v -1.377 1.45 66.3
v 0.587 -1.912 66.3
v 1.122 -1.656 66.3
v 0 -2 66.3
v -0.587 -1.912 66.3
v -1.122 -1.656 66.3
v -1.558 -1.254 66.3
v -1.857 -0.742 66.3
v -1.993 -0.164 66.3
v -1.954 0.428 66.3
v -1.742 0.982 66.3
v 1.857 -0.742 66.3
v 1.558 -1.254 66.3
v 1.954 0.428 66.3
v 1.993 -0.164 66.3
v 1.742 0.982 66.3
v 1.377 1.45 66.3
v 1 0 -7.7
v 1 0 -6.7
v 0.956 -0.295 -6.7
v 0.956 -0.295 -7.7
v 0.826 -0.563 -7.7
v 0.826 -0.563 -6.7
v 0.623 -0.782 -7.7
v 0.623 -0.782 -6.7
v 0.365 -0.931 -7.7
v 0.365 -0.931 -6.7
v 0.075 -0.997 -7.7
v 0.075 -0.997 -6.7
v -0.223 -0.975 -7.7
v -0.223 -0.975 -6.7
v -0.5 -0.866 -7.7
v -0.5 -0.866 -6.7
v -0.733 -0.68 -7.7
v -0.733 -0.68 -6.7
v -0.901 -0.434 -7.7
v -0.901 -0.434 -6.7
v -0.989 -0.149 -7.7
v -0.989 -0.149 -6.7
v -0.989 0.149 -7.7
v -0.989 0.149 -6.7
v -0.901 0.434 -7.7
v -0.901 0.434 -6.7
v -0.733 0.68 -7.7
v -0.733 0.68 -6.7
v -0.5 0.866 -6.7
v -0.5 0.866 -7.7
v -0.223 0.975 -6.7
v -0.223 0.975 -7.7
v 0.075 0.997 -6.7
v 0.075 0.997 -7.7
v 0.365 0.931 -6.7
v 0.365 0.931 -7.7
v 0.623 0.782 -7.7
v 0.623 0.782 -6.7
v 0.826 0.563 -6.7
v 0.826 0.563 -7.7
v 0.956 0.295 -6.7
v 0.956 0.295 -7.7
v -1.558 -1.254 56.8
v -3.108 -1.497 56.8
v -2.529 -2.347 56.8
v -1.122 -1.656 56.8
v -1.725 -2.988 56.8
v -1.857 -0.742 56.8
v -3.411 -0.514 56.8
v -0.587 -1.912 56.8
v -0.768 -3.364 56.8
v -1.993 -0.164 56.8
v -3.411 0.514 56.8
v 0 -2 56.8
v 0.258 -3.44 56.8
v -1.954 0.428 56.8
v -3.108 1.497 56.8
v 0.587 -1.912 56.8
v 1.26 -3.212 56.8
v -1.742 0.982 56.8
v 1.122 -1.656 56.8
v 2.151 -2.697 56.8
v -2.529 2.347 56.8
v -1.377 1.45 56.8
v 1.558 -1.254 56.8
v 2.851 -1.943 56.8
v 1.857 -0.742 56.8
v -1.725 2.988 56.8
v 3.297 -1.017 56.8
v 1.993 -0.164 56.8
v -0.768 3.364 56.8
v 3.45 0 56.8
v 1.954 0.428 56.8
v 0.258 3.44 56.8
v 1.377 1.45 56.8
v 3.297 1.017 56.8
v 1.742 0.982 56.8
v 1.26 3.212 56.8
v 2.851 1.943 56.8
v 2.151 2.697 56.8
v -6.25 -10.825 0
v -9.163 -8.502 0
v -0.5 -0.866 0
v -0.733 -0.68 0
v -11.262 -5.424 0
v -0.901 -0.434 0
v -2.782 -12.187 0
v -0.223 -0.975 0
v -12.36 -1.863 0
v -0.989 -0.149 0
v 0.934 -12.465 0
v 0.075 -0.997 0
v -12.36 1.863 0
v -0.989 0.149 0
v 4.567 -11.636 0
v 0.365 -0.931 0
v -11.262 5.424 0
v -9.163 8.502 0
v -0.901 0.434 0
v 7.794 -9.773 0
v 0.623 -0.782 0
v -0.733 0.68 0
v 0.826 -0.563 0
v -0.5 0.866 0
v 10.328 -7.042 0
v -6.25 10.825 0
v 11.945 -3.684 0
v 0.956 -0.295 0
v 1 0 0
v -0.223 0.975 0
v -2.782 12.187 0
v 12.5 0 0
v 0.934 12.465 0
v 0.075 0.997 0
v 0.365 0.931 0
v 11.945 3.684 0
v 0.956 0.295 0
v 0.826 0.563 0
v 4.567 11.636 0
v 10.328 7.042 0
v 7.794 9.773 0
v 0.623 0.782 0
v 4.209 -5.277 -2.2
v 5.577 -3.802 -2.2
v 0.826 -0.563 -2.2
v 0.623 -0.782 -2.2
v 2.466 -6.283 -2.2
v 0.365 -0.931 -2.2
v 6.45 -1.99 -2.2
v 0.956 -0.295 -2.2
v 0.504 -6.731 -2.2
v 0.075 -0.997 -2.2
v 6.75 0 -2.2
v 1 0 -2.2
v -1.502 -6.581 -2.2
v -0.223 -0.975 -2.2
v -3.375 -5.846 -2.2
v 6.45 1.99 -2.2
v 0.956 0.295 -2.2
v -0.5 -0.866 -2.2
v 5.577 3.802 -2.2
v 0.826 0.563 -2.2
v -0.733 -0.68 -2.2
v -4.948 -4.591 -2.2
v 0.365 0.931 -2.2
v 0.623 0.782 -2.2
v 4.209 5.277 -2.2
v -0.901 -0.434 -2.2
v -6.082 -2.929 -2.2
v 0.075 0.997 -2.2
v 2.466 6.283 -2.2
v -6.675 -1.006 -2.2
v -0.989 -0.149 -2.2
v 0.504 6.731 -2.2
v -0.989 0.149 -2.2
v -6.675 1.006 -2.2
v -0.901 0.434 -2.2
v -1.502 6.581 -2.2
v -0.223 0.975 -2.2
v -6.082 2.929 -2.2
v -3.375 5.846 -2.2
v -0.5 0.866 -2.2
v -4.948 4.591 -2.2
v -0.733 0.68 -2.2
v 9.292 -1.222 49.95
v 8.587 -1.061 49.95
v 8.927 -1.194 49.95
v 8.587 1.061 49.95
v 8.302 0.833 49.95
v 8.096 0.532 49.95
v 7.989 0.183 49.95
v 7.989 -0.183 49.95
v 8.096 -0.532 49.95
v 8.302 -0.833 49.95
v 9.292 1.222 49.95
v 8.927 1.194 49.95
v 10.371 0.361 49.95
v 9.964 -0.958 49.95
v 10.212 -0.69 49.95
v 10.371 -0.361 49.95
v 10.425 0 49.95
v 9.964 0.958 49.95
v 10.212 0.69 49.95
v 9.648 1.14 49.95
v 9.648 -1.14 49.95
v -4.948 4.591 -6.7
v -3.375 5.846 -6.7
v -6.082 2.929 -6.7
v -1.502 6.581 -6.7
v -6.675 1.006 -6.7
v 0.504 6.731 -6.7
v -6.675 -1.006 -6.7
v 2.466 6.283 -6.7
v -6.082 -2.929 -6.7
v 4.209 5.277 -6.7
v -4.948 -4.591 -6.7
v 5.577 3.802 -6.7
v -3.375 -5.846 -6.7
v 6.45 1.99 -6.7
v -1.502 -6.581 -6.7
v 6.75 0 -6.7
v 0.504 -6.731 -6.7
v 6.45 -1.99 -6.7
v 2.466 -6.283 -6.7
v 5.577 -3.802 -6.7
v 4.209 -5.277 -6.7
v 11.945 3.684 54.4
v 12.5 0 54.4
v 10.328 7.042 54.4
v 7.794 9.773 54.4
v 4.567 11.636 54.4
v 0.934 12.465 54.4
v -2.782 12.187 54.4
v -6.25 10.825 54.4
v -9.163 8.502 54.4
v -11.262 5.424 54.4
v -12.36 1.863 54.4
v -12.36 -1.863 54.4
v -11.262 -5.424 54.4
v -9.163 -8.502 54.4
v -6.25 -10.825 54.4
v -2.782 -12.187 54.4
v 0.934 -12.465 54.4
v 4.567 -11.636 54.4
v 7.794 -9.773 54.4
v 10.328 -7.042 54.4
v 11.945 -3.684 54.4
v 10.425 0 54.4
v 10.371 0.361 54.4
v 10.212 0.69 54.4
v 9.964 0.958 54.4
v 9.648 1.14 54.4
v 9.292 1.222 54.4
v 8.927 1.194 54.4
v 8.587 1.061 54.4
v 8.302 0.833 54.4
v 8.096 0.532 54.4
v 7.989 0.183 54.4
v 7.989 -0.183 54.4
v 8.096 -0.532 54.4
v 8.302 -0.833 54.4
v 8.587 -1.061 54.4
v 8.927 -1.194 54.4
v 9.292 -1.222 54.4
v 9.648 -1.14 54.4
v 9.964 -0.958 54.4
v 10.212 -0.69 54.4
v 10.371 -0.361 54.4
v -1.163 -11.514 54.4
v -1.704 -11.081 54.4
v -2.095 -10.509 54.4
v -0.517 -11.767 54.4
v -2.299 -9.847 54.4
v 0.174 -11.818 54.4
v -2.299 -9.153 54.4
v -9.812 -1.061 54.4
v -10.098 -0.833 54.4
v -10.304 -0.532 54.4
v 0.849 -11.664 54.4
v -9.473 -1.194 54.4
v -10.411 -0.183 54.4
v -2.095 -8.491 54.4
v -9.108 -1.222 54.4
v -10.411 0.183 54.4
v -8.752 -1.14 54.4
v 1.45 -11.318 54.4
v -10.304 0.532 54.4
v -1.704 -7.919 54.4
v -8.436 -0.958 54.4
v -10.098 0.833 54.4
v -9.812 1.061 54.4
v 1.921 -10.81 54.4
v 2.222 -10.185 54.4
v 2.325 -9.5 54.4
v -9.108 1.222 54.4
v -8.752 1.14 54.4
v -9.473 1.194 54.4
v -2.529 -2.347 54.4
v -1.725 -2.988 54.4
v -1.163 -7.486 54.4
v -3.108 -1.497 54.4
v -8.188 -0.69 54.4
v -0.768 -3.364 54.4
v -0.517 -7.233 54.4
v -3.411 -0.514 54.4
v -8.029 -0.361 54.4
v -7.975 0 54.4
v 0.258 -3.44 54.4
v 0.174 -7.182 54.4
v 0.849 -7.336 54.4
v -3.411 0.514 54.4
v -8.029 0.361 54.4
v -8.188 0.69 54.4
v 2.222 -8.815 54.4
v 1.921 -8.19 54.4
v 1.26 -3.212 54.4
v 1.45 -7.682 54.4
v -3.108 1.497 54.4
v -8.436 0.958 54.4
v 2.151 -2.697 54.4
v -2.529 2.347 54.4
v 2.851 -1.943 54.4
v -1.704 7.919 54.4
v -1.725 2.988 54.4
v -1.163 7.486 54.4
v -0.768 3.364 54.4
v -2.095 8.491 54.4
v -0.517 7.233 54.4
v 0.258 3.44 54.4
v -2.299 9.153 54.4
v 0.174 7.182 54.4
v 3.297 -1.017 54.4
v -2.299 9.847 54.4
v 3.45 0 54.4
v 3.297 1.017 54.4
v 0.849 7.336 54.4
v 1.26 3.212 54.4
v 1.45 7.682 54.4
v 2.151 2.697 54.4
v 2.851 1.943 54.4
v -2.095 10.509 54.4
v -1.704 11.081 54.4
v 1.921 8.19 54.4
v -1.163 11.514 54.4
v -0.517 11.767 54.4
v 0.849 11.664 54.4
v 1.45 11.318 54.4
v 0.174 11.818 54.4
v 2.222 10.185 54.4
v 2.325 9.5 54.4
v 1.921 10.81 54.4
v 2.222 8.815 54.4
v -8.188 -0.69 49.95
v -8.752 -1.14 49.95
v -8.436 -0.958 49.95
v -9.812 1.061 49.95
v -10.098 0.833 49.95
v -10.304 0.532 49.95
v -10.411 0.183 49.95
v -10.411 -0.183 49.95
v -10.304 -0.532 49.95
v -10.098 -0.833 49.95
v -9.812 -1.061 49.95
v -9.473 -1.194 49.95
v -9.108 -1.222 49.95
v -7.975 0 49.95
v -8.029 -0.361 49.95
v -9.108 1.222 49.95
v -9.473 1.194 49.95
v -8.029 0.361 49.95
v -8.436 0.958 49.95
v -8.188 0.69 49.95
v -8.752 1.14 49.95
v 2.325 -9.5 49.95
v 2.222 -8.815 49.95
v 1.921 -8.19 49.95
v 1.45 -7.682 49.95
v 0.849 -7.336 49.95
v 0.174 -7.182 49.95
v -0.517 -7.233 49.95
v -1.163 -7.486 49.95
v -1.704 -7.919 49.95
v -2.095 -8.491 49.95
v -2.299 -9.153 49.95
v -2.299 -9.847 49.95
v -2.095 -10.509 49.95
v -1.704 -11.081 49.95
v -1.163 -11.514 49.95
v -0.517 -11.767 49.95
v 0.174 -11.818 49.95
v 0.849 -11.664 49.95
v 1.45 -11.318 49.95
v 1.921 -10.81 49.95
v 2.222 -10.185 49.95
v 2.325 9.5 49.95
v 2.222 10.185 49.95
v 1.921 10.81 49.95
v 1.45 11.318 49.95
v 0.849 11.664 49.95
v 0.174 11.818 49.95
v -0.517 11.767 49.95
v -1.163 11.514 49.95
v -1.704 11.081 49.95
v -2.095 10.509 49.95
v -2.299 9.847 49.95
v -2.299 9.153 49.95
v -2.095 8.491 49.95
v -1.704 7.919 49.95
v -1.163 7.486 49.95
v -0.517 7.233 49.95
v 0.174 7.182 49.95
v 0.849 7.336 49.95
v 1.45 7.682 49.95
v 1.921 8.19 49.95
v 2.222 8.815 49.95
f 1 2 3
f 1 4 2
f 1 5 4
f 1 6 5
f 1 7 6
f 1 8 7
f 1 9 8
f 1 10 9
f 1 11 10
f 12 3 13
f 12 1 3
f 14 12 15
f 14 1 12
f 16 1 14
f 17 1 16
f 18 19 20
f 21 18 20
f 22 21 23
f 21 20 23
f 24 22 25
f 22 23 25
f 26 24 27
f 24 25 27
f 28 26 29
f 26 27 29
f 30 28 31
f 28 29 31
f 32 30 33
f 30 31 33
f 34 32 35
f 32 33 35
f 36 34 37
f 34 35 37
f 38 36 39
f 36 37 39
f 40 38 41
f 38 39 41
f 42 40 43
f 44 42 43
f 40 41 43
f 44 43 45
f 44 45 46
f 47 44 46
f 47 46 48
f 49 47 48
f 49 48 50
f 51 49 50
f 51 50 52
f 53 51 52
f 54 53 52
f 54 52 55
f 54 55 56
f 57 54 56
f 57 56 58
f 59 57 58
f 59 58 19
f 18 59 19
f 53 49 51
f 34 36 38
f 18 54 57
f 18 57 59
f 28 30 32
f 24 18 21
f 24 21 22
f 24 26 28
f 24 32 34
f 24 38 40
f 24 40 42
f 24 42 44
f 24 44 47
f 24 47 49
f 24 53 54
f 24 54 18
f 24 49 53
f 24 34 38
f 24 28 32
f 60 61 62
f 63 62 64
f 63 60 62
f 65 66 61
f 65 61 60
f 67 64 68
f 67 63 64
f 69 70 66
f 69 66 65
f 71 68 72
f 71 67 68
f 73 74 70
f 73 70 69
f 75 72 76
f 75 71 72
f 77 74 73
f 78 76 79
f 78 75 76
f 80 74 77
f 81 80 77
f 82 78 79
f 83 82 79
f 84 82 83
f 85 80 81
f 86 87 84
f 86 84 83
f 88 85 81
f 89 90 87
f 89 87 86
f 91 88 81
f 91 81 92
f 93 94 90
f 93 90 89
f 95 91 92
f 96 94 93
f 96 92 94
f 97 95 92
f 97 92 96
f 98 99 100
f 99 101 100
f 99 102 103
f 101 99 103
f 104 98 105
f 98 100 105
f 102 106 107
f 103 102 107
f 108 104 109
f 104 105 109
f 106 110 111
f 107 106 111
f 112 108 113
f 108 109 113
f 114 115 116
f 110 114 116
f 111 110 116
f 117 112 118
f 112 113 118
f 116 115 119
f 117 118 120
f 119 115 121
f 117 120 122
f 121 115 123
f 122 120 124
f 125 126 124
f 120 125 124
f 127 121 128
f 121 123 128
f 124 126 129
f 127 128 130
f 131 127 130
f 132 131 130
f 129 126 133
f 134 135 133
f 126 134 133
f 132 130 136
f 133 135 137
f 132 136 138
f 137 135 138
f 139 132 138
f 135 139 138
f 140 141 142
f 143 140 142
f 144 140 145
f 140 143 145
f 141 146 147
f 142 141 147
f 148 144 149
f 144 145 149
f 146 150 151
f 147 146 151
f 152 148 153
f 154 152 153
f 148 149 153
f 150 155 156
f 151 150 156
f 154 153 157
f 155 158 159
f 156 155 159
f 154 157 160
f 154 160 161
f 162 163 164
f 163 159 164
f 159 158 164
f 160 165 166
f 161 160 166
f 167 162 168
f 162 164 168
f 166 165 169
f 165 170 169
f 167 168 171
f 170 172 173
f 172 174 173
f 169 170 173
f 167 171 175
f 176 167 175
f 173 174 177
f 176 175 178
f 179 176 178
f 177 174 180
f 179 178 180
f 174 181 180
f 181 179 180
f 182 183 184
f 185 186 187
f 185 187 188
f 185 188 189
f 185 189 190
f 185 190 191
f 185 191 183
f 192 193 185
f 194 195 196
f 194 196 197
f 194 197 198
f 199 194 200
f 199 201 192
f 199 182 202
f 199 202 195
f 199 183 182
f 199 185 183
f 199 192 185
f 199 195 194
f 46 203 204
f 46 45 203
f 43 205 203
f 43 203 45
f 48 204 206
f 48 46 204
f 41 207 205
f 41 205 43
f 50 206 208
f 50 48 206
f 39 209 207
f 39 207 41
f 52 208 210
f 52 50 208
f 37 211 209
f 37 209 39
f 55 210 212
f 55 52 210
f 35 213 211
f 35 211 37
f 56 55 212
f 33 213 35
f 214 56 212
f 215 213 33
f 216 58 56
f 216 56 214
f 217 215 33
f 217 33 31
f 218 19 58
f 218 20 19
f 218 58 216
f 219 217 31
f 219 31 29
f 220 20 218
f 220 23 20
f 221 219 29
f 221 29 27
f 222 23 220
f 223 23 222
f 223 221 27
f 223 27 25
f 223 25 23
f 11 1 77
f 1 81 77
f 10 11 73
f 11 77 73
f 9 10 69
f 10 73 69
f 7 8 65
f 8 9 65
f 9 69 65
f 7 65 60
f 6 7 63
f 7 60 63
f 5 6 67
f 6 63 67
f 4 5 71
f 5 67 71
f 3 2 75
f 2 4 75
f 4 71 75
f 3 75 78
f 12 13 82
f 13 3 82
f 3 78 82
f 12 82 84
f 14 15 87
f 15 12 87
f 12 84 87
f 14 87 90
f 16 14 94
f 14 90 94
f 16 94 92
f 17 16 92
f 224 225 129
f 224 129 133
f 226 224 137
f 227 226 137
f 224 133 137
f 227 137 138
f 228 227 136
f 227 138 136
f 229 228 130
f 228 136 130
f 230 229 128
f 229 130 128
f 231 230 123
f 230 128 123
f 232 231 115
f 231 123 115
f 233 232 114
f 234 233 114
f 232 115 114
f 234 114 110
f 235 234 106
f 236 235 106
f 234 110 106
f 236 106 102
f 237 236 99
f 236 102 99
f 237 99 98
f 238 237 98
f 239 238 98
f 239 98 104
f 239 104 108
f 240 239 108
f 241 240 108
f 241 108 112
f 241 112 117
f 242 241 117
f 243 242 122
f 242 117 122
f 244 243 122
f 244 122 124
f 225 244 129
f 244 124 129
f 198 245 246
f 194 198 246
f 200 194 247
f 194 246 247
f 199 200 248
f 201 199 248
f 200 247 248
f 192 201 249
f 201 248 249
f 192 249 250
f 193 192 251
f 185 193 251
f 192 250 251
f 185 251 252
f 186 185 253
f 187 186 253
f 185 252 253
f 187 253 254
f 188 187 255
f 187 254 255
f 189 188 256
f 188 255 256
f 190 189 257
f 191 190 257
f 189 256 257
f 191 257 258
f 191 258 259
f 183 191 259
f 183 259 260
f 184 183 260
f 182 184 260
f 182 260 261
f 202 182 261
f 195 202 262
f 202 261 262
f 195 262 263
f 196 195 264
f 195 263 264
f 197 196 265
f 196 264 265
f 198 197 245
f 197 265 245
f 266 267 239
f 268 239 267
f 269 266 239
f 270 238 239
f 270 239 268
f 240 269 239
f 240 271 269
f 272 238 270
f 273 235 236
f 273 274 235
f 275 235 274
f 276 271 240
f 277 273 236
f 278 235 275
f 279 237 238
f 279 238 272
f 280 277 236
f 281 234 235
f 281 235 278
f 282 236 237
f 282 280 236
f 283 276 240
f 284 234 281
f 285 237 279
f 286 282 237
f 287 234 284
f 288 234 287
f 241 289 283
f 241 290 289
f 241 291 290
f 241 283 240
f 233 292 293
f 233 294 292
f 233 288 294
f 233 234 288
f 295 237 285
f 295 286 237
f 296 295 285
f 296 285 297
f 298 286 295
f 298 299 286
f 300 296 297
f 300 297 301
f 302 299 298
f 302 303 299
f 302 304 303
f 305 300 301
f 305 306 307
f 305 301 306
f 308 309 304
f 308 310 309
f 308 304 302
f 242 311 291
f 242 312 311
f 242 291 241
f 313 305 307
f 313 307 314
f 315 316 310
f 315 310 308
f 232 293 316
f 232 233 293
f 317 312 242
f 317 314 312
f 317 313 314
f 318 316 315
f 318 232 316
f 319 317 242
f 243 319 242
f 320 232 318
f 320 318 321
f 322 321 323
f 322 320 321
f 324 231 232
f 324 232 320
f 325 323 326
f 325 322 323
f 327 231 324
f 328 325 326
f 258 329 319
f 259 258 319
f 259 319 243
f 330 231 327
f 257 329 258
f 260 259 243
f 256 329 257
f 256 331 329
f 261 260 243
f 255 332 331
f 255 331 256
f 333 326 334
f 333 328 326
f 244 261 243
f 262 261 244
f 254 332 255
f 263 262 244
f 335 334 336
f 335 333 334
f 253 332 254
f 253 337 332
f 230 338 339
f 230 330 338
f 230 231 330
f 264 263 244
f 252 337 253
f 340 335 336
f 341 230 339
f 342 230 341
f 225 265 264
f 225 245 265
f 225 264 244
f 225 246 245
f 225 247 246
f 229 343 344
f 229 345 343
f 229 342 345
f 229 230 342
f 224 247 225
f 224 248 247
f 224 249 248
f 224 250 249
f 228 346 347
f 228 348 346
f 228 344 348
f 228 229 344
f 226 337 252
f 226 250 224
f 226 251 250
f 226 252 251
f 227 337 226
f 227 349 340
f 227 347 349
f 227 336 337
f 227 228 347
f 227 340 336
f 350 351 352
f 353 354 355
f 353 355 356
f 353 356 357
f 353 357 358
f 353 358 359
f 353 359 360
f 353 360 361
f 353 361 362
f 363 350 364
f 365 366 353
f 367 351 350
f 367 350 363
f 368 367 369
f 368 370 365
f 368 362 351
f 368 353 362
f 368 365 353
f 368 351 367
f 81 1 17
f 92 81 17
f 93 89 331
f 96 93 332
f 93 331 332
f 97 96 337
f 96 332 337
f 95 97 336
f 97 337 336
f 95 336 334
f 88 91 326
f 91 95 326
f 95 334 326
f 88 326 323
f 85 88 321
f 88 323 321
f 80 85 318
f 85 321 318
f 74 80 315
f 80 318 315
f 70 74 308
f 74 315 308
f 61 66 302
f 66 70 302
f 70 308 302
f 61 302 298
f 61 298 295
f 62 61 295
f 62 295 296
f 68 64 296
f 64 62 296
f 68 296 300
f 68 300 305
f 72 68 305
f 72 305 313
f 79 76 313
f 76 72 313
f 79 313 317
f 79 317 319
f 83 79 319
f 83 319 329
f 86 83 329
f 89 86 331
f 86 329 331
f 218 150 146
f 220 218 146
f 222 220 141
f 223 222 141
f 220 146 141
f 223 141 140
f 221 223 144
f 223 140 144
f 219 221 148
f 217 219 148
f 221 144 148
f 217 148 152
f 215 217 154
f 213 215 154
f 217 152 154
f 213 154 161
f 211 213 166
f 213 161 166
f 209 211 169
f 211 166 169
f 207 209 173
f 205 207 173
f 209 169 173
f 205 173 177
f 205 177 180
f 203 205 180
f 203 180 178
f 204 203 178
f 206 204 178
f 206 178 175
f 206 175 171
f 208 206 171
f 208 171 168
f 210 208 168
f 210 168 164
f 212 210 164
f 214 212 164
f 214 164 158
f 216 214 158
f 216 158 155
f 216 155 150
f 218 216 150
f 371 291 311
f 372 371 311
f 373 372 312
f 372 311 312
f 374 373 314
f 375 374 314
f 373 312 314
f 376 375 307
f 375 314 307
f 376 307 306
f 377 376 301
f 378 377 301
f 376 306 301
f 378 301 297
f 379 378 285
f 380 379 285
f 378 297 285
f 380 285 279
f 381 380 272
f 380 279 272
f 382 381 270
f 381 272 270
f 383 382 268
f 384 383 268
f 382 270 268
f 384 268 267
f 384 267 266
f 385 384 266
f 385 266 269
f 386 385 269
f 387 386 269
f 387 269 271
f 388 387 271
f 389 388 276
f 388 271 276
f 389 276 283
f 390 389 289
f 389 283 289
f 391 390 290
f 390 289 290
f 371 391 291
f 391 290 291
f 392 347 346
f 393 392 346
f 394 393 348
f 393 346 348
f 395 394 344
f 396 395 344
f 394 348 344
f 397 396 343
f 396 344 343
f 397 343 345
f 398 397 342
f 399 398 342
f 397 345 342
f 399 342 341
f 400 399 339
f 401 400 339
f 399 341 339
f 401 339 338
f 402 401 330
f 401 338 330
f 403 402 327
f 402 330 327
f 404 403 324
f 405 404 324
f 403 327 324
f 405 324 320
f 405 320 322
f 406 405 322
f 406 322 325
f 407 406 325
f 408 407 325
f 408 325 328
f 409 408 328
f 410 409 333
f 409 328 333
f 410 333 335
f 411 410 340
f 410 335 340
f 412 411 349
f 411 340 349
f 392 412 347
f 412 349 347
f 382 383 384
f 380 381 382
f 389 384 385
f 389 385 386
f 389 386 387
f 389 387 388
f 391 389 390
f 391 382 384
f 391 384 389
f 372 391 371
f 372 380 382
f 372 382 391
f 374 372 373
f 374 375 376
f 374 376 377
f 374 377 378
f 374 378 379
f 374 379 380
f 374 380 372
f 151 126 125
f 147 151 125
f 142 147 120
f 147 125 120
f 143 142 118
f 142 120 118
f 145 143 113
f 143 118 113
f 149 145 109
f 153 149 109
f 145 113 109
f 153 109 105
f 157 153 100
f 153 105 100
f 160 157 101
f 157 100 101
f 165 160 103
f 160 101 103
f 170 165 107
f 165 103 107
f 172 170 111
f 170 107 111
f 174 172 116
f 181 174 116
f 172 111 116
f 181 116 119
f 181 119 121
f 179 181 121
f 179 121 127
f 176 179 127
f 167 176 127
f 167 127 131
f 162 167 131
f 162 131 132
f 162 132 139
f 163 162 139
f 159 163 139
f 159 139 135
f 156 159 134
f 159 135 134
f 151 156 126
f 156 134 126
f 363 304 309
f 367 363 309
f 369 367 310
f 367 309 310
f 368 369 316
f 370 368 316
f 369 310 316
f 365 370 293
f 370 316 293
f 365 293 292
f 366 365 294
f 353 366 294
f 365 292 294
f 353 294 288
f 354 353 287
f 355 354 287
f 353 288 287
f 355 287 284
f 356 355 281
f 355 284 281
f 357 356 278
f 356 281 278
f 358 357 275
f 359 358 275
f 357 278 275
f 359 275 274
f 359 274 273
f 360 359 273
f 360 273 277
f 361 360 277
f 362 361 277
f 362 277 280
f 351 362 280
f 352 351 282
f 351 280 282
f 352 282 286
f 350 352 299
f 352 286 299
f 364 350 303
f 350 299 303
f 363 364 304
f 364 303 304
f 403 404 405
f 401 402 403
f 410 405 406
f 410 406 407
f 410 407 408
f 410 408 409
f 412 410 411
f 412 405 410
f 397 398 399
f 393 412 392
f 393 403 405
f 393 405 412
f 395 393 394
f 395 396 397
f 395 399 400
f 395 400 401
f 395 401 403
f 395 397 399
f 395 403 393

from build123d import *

# Parameters (mm, degrees)
SKETCH1_R           = 12.5
BOSS_EXTRUDE1_DEPTH = 54.4
SKETCH2_R           = 3.45
BOSS_EXTRUDE2_DEPTH = 2.4
SKETCH3_R           = 2
BOSS_EXTRUDE3_DEPTH = 9.5
SKETCH4_W           = 6.273306019
SKETCH4_H           = 2.779797978
CUT_EXTRUDE1_DEPTH  = 9.5
SKETCH5_R           = 2.325
CUT_EXTRUDE2_DEPTH  = 4.45
SKETCH6_R           = 1.225
CUT_EXTRUDE3_DEPTH  = 4.45
SKETCH8_R           = 1
BOSS_EXTRUDE5_DEPTH = 7.7
SKETCH9_R           = 6.75
BOSS_EXTRUDE6_DEPTH = 6.7
SKETCH10_R          = 6.75
CUT_EXTRUDE5_DEPTH  = 2.2
SKETCH11_R          = 1
BOSS_EXTRUDE7_DEPTH = 2.2


with BuildPart() as part:
    # Sketch1 → Boss-Extrude1 (new body)
    with BuildSketch(Plane.XY):
        Circle(SKETCH1_R)
    extrude(amount=BOSS_EXTRUDE1_DEPTH)

    # Sketch2 → Boss-Extrude2 (add)
    with BuildSketch(Plane.XY.offset(54.4)):
        Circle(SKETCH2_R)
    extrude(amount=BOSS_EXTRUDE2_DEPTH)

    # Sketch3 → Boss-Extrude3 (add)
    with BuildSketch(Plane.XY.offset(56.8)):
        Circle(SKETCH3_R)
    extrude(amount=BOSS_EXTRUDE3_DEPTH)

    # Sketch4 → Cut-Extrude1 (cut)
    with BuildSketch(Plane.XY.offset(66.3)):
        with Locations((-0.006157841, 2.839898989)):
            Rectangle(SKETCH4_W, SKETCH4_H)
    extrude(amount=-CUT_EXTRUDE1_DEPTH, mode=Mode.SUBTRACT)

    # Sketch5 → Cut-Extrude2 (cut)
    with BuildSketch(Plane.XY.offset(54.4)):
        with Locations((0, 9.5)):
            Circle(SKETCH5_R)
        with Locations((0, -9.5)):
            Circle(SKETCH5_R)
    extrude(amount=-CUT_EXTRUDE2_DEPTH, mode=Mode.SUBTRACT)

    # Sketch6 → Cut-Extrude3 (cut)
    with BuildSketch(Plane.XY.offset(54.4)):
        with Locations((9.2, 0)):
            Circle(SKETCH6_R)
        with Locations((-9.2, 0)):
            Circle(SKETCH6_R)
    extrude(amount=-CUT_EXTRUDE3_DEPTH, mode=Mode.SUBTRACT)

    # Sketch8 → Boss-Extrude5 (add)
    with BuildSketch(Plane(origin=(0, 0, 0), x_dir=(-1, 0, 0), z_dir=(0, 0, -1))):
        with Locations(Location((0, 0, 0), (0, 0, 180))):
            Circle(SKETCH8_R)
    extrude(amount=BOSS_EXTRUDE5_DEPTH)

    # Sketch9 → Boss-Extrude6 (add)
    with BuildSketch(Plane(origin=(0, 0, 0), x_dir=(-1, 0, 0), z_dir=(0, 0, -1))):
        with Locations(Location((0, 0, 0), (0, 0, 180))):
            Circle(SKETCH9_R)
    extrude(amount=BOSS_EXTRUDE6_DEPTH)

    # Sketch10 → Cut-Extrude5 (cut)
    with BuildSketch(Plane(origin=(0, 0, 0), x_dir=(-1, 0, 0), z_dir=(0, 0, -1))):
        Circle(SKETCH10_R)
    extrude(amount=CUT_EXTRUDE5_DEPTH, mode=Mode.SUBTRACT)


with BuildPart() as cut_extrude5_piece_1:
    # of the separate pieces the step leaves, piece 1, a body of its own (cut_extrude5_pieces)
    add(part.part.solids().sort_by_distance((12.5, 0, 0))[0])



with BuildPart() as cut_extrude5_piece_2:
    # of the separate pieces the step leaves, piece 2, a body of its own (cut_extrude5_pieces)
    add(part.part.solids().sort_by_distance((6.75, 0, -2.2))[0])


with BuildPart() as cut_extrude5_piece_1_1:
    add(cut_extrude5_piece_1.part)

    add(cut_extrude5_piece_2.part)  # Boss-Extrude7 merges Cut-Extrude5 piece 2
    # Sketch11 → Boss-Extrude7 (add)
    with BuildSketch(Plane(origin=(0, 0, 0), x_dir=(-1, 0, 0), z_dir=(0, 0, -1))):
        with Locations(Location((0, 0, 0), (0, 0, 180))):
            Circle(SKETCH11_R)
    extrude(amount=BOSS_EXTRUDE7_DEPTH)


solid = cut_extrude5_piece_1_1.part
